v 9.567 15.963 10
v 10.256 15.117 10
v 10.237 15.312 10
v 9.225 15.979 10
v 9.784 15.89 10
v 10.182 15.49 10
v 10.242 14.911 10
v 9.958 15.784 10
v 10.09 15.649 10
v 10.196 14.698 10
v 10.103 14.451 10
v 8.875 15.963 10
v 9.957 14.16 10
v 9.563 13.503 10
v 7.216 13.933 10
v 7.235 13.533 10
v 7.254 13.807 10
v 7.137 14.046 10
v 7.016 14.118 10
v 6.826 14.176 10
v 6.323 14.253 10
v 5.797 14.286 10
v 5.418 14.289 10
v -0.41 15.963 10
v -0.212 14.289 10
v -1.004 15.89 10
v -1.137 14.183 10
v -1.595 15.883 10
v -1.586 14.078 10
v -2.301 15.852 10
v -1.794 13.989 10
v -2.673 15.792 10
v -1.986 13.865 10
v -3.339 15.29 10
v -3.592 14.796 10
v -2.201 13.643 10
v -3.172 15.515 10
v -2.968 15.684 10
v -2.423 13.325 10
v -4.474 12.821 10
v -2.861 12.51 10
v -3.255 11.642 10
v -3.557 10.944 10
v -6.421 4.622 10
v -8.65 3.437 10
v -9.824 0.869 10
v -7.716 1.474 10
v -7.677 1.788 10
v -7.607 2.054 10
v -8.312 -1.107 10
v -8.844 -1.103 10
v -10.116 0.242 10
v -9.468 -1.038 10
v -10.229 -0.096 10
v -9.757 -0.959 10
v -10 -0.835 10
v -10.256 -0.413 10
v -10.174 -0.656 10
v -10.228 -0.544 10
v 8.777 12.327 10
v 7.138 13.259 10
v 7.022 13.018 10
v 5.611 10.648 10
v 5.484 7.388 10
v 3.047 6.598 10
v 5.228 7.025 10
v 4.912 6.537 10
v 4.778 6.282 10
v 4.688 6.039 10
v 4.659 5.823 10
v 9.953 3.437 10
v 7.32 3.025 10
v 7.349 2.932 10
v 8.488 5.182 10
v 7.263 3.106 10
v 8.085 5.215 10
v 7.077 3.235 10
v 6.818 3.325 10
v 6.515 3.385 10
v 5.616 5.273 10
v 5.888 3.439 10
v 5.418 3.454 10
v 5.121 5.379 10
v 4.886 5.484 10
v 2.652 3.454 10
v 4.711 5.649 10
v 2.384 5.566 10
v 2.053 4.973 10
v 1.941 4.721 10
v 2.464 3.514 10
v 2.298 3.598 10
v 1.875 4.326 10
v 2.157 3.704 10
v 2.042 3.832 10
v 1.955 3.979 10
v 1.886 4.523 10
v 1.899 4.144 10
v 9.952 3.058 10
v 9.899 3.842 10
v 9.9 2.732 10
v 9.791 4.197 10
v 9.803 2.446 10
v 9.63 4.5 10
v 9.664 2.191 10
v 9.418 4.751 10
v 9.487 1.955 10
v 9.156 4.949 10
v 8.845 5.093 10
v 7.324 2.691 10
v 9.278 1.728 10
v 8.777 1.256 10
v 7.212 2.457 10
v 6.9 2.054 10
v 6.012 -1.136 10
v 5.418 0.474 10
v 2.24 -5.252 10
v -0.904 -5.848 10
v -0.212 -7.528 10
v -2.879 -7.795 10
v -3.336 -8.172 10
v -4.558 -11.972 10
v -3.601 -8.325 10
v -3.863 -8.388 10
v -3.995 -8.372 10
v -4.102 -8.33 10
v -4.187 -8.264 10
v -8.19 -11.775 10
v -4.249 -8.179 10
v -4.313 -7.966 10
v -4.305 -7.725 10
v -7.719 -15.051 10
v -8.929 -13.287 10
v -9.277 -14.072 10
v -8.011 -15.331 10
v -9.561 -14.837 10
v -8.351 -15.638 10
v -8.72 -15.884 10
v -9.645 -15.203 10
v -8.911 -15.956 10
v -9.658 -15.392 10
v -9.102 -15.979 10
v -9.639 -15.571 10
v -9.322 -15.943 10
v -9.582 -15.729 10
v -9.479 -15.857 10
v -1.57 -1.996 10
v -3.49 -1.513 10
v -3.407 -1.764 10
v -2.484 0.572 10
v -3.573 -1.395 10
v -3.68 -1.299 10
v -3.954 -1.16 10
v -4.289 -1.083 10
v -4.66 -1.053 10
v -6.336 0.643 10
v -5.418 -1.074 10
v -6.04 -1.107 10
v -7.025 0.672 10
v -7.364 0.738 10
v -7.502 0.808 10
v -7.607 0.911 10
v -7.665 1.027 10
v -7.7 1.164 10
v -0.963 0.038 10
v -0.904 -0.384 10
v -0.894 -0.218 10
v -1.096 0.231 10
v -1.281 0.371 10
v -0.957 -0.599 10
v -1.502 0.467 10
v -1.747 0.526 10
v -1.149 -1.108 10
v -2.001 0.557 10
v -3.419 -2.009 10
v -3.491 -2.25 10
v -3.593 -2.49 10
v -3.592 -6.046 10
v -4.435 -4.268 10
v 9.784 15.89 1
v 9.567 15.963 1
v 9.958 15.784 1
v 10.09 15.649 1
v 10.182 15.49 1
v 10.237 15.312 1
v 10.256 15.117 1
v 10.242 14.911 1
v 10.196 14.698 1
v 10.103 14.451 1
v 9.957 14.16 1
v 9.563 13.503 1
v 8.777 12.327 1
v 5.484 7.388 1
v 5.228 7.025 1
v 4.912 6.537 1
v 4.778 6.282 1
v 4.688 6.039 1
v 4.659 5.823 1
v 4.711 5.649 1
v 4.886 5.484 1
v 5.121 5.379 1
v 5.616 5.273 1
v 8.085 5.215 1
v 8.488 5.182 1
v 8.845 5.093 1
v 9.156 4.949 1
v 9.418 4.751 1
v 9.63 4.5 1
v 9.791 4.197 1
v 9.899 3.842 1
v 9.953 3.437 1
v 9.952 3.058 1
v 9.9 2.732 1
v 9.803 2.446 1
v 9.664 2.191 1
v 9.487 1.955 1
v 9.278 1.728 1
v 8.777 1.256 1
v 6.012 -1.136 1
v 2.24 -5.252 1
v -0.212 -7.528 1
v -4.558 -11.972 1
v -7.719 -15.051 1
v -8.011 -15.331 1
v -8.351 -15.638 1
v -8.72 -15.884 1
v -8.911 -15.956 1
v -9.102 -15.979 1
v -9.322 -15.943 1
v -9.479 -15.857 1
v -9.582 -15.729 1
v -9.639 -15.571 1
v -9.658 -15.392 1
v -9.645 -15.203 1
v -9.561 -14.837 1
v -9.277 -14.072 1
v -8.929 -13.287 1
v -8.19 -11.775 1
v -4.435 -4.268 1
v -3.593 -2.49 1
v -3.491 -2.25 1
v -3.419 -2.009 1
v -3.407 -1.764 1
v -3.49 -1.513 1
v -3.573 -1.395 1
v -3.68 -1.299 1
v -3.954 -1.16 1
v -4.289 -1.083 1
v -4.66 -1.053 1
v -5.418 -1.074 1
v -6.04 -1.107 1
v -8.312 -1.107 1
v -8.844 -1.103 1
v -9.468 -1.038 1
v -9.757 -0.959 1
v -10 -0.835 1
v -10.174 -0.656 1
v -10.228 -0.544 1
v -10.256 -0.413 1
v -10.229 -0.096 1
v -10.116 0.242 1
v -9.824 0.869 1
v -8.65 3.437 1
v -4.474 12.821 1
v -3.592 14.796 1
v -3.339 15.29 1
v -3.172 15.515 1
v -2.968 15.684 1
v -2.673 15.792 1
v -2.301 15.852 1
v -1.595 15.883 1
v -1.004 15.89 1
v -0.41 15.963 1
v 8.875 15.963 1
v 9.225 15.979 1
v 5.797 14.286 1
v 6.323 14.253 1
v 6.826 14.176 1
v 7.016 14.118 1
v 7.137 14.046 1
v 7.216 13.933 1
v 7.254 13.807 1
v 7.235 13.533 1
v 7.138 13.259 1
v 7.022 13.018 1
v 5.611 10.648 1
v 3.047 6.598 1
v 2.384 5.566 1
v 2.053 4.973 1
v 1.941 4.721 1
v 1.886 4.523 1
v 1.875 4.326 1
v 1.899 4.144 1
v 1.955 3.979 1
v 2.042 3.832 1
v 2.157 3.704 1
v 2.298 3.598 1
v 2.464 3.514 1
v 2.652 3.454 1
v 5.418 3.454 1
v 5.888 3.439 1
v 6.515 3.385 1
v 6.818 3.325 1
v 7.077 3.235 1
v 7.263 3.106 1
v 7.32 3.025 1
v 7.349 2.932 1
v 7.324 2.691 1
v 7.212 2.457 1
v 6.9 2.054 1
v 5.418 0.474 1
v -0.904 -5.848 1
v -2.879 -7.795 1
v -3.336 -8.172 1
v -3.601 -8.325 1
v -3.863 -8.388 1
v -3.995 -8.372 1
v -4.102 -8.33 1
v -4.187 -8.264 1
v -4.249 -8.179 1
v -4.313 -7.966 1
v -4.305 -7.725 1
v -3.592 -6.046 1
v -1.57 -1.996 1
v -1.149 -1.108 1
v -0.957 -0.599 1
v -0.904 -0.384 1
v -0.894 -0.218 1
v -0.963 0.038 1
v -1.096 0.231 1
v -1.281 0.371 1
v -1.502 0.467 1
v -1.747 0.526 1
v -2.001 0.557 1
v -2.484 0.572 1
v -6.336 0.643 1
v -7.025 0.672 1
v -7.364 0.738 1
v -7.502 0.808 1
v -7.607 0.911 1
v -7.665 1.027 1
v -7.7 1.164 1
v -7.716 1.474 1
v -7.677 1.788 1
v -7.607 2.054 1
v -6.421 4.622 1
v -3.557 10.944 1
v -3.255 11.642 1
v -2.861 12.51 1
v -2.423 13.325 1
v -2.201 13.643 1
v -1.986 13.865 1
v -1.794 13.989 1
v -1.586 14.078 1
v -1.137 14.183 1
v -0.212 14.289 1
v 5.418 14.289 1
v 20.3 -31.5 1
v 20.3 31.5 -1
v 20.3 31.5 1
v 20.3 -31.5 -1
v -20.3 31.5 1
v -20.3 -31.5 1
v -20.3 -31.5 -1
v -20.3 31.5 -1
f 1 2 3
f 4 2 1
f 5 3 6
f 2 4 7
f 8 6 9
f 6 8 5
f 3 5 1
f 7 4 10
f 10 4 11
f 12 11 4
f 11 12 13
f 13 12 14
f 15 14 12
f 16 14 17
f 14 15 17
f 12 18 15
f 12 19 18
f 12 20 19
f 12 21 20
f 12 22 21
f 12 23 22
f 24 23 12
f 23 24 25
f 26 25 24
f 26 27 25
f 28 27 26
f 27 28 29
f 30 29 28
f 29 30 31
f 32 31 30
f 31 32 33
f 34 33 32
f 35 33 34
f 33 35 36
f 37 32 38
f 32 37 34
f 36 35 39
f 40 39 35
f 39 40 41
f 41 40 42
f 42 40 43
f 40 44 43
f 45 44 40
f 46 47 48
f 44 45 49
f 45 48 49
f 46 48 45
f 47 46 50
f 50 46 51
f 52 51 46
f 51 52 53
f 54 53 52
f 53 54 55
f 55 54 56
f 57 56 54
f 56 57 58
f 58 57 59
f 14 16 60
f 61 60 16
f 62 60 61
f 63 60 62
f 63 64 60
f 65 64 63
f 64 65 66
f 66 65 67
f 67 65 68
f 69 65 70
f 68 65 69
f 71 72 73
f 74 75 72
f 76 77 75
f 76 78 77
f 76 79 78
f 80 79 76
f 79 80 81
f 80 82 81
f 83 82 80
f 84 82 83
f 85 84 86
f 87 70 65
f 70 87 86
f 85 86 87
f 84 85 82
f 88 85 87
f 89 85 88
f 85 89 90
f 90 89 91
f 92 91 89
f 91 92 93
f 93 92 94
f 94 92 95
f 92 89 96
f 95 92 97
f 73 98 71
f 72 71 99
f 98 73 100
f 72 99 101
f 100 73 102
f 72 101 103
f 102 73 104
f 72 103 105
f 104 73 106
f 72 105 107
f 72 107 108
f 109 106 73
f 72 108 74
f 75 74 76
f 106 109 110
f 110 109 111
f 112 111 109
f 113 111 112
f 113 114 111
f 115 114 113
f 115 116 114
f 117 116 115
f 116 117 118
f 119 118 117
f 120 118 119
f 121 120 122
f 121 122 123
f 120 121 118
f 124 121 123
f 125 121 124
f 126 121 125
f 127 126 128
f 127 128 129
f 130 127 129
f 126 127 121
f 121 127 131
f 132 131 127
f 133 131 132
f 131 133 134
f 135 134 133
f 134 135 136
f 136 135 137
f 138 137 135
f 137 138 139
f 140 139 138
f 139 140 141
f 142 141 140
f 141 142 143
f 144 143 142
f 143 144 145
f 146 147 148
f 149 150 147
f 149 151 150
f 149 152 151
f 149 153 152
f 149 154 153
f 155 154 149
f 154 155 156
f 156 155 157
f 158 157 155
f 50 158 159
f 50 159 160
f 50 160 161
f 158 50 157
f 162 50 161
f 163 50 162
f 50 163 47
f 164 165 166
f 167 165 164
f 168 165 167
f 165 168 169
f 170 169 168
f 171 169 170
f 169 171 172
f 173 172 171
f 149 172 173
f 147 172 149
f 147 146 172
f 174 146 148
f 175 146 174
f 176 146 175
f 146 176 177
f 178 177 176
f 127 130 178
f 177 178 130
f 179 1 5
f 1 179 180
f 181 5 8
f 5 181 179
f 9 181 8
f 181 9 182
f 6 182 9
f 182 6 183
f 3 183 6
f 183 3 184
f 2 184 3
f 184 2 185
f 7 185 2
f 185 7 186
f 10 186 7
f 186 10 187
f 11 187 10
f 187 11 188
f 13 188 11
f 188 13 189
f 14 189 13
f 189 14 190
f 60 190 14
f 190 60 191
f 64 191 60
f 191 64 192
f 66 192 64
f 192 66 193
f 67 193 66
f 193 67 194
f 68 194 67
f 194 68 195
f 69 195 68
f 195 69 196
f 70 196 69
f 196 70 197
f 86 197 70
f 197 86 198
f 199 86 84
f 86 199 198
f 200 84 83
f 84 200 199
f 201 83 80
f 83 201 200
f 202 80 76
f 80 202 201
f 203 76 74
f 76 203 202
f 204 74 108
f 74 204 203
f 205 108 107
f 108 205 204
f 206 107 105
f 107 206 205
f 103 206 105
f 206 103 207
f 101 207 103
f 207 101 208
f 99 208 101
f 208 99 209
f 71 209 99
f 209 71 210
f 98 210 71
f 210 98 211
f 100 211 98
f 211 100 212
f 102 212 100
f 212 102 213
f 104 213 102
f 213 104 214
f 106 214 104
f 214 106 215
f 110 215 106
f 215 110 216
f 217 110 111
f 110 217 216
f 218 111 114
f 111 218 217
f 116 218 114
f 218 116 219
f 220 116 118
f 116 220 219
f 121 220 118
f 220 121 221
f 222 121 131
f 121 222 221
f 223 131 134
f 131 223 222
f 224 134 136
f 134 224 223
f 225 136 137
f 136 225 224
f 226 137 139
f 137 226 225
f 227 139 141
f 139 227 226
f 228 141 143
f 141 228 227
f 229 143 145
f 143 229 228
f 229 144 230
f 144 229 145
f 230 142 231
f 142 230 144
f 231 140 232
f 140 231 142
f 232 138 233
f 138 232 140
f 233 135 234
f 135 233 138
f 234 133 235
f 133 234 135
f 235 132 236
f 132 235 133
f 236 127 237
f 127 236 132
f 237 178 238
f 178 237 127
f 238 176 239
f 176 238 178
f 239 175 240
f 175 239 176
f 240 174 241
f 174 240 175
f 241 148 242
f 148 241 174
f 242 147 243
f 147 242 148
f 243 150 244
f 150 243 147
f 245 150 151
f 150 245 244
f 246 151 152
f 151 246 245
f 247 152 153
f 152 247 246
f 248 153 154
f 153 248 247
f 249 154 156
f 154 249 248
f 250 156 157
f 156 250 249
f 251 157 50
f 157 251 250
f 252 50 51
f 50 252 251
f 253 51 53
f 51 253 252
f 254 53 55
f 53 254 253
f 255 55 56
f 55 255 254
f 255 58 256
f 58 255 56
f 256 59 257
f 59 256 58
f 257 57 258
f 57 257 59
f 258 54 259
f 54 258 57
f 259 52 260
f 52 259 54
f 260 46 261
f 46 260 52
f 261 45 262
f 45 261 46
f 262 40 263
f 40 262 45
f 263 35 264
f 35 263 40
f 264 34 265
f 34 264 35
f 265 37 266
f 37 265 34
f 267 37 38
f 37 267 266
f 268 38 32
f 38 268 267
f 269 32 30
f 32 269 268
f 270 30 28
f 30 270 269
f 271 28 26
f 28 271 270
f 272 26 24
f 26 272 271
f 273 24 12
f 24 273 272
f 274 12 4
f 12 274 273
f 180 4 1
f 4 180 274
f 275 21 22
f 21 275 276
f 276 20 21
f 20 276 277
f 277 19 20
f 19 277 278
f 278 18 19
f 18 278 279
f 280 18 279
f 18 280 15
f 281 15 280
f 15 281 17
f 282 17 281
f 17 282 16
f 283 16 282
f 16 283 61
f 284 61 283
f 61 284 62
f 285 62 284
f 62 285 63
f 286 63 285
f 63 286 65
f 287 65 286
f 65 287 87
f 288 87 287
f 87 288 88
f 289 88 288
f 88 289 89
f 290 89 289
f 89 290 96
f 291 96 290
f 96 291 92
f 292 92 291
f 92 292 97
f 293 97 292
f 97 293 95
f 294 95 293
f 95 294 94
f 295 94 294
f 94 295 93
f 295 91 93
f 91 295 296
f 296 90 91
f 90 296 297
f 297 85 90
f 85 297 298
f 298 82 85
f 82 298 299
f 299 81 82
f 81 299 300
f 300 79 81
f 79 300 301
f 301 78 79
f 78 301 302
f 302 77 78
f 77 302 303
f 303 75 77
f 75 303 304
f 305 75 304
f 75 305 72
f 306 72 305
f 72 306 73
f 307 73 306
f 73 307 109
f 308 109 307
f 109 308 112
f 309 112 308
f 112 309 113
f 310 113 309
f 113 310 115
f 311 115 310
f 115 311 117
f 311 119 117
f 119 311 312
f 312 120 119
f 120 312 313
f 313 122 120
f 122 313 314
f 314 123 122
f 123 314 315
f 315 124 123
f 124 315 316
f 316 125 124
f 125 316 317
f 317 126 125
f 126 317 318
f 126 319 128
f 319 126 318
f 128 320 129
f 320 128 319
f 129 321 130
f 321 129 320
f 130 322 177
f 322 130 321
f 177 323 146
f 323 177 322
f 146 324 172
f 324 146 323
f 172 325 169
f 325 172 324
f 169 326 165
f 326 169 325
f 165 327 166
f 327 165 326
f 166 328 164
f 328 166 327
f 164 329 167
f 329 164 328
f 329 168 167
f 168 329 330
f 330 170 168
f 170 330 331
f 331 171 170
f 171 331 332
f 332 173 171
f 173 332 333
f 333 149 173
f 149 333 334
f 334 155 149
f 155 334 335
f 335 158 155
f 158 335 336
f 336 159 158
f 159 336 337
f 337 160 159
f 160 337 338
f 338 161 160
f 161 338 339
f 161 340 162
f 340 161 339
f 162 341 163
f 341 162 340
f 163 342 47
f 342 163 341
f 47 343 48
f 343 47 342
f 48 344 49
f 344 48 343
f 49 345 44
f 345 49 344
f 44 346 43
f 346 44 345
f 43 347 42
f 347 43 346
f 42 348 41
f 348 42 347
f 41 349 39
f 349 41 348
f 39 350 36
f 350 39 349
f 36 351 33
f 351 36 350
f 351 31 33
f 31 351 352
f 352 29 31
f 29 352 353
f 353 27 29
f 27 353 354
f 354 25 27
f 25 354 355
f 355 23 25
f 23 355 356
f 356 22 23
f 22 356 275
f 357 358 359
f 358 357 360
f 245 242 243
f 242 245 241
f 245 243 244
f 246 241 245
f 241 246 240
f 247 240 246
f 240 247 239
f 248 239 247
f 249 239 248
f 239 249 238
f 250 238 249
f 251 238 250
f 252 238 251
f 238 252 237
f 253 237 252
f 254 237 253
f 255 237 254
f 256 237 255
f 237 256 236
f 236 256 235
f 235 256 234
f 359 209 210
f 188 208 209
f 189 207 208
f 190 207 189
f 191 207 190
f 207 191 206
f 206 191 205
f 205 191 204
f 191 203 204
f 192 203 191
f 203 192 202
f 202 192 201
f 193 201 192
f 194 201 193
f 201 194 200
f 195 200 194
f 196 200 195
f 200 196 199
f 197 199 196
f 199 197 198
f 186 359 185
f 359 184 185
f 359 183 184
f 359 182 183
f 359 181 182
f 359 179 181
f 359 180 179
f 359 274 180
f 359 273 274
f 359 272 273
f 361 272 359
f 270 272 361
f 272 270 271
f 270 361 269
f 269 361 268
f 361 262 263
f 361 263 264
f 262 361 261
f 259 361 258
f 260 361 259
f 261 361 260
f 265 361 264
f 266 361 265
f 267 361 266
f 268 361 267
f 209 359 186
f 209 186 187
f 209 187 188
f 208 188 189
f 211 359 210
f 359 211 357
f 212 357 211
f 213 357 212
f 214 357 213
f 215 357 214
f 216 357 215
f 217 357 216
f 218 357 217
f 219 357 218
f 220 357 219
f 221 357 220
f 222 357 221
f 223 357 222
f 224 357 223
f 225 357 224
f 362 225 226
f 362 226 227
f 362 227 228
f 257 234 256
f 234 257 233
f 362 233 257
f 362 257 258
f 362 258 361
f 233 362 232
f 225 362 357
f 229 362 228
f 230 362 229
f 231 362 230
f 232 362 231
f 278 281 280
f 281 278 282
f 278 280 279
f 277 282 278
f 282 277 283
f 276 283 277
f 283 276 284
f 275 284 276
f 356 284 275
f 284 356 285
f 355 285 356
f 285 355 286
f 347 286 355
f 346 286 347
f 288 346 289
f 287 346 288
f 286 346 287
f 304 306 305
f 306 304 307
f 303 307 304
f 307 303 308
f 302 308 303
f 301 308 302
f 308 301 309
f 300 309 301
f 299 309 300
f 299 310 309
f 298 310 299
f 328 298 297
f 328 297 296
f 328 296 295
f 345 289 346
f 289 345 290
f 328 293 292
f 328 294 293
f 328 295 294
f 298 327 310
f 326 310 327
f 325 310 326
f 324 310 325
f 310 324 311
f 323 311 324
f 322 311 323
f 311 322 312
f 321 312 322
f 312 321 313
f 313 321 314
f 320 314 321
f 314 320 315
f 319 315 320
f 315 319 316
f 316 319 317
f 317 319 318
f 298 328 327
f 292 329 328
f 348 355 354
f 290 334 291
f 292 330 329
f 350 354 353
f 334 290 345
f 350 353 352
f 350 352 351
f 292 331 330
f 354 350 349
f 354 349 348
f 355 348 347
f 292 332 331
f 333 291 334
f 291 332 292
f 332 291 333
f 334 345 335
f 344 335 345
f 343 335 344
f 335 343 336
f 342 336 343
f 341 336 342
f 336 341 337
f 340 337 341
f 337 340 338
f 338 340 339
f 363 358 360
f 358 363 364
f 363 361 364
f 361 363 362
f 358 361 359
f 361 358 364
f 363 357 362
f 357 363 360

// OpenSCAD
// file: ../../lightning-bolt.scad
// Module names are of the form poly_<inkscape-path-id>().  As a result,
// you can associate a polygon in this OpenSCAD program with the corresponding
// SVG element in the Inkscape document by looking for the XML element with
// the attribute id="inkscape-path-id".

// fudge value is used to ensure that subtracted solids are a tad taller
// in the z dimension than the polygon being subtracted from.  This helps
// keep the resulting .stl file manifold.
fudge = 0.1;

module poly_Selection(h)
{
  scale([25.4/90, -25.4/90, 1]) union()
  {
    difference()
    {
       linear_extrude(height=h)
         polygon([[-4.148906,-161.604375],[29.851094,-161.604375],[89.851094,-161.604375],[93.388594,-161.765625],[96.851094,-161.604375],[99.052539,-160.861992],[100.810781,-159.788437],[102.146680,-158.426602],[103.081094,-156.819375],[103.634883,-155.009648],[103.828906,-153.040312],[103.684023,-150.954258],[103.221094,-148.794375],[102.277969,-146.302969],[100.798594,-143.351250],[96.816094,-136.696875],[88.851094,-124.794375],[55.521094,-74.794375],[52.930781,-71.123125],[49.723594,-66.176875],[48.375586,-63.594766],[47.457656,-61.136875],[47.164570,-58.950859],[47.691094,-57.184375],[49.468281,-55.523281],[51.843594,-54.455625],[56.851094,-53.384375],[81.851094,-52.794375],[85.930117,-52.456934],[89.547656,-51.555469],[92.689414,-50.098770],[95.341094,-48.095625],[97.488398,-45.554824],[99.117031,-42.485156],[100.212695,-38.895410],[100.761094,-34.794375],[100.747676,-30.961406],[100.226250,-27.654375],[99.240059,-24.763594],[97.832344,-22.179375],[96.046348,-19.792031],[93.925313,-17.491875],[88.851094,-12.714375],[60.861094,11.495625],[22.681094,53.165625],[-2.148906,76.215625],[-46.148906,121.205625],[-78.148906,152.375625],[-81.104219,155.211094],[-84.541406,158.319375],[-88.282344,160.803281],[-90.211055,161.530723],[-92.148906,161.765625],[-94.372402,161.407539],[-95.966250,160.530312],[-97.010488,159.238242],[-97.585156,157.635625],[-97.770293,155.826758],[-97.645937,153.915937],[-96.788906,150.205625],[-93.919844,142.465000],[-90.396406,134.510625],[-82.908906,119.205625],[-44.898906,43.205625],[-36.378906,25.205625],[-35.345781,22.782813],[-34.608906,20.343125],[-34.494531,17.862187],[-35.328906,15.315625],[-36.170610,14.127329],[-37.254570,13.148945],[-40.029844,11.748437],[-43.415898,10.967148],[-47.173906,10.658125],[-54.850469,10.869062],[-61.148906,11.205625],[-84.148906,11.205625],[-89.537187,11.162031],[-95.852656,10.511875],[-98.777129,9.708848],[-101.236250,8.453594],[-102.997637,6.645918],[-103.544060,5.503611],[-103.828906,4.185625],[-103.551094,0.976250],[-102.416406,-2.454375],[-99.458906,-8.794375],[-87.568906,-34.794375],[-45.288906,-129.794375],[-36.368906,-149.794375],[-33.801406,-154.788125],[-32.116406,-157.068906],[-30.048906,-158.784375],[-27.055781,-159.877500],[-23.293906,-160.479375],[-16.148906,-160.794375],[-10.167656,-160.861875],[-4.148906,-161.604375]]);
       translate([0, 0, -fudge])
         linear_extrude(height=h+2*fudge)
           polygon([[-2.148906,-144.654375],[-11.515156,-143.585625],[-16.058125,-142.526719],[-18.163730,-141.618809],[-20.108906,-140.364375],[-22.284258,-138.120078],[-24.525469,-134.897500],[-28.966406,-126.644375],[-32.953594,-117.858750],[-36.008906,-110.794375],[-65.008906,-46.794375],[-77.008906,-20.794375],[-77.717656,-18.100625],[-78.111406,-14.919375],[-77.953906,-11.783125],[-77.594609,-10.398281],[-77.008906,-9.224375],[-75.949375,-8.181387],[-74.555156,-7.474844],[-71.118906,-6.800625],[-64.148906,-6.514375],[-25.148906,-5.794375],[-20.262344,-5.639844],[-17.686992,-5.320645],[-15.208906,-4.723125],[-12.967070,-3.759512],[-11.100469,-2.342031],[-9.748086,-0.382910],[-9.048906,2.205625],[-9.148008,3.888379],[-9.686094,6.060156],[-11.633906,11.216875],[-15.898906,20.205625],[-36.368906,61.205625],[-43.578906,78.205625],[-43.665156,80.649063],[-43.016406,82.798125],[-42.384766,83.660898],[-41.531406,84.328437],[-40.443672,84.760195],[-39.108906,84.915625],[-36.457187,84.283281],[-33.772656,82.729375],[-29.148906,78.915625],[-9.148906,59.205625],[54.851094,-4.794375],[69.851094,-20.794375],[73.011094,-24.875625],[74.145781,-27.247656],[74.401094,-29.684375],[74.109907,-30.624995],[73.529883,-31.442773],[71.644531,-32.745312],[69.027461,-33.663008],[65.961094,-34.266875],[59.610156,-34.817188],[54.851094,-34.964375],[26.851094,-34.964375],[24.944707,-35.570820],[23.266250,-36.420312],[21.835527,-37.498086],[20.672344,-38.789375],[19.796504,-40.279414],[19.227813,-41.953437],[18.986074,-43.796680],[19.091094,-45.794375],[19.653008,-47.792656],[20.785156,-50.341250],[24.138594,-56.346875],[30.851094,-66.794375],[56.801094,-107.794375],[71.091094,-131.794375],[72.260937,-134.232188],[73.242344,-137.009375],[73.438125,-139.779062],[73.054785,-141.052695],[72.251094,-142.194375],[71.029297,-142.931309],[69.104844,-143.516719],[64.008594,-144.290625],[58.683594,-144.631406],[54.851094,-144.654375],[-2.148906,-144.654375]]);
    }
  }
}

module lightningBolt(height = 1,
                     showBackground = false)
{
    scaleFactor = 0.35;
    scale([scaleFactor, 
          scaleFactor + 0.0, 
           1])
    poly_Selection(height);

    if(showBackground)
    {
        color("green")
        cube([20.6, 32, height], center = true);
    }    
}
// file: ../letters-symbols-faceplate.scad
use <../lightning-bolt.scad>;

LETTER_D = 68;
LETTER_E = 69;
LETTER_G = 71;
LETTER_I = 73;
LETTER_O = 79;

SYMBOL_LIGHTNING_BOLT = 33;

STANDARD_LETTER_HEIGHT = 33; // see the O.scad

module lettersSymbolsFaceplate(horizontalPadding = 10,
                               slot1 = SYMBOL_LIGHTNING_BOLT,
                               slotWidth1 = 20.6,
                               verticalPadding = 15,
                               zLength = 2)
{
    union()
    {
        cubeLengthX = horizontalPadding + 
                      slotWidth1 +
                      horizontalPadding;

        cubeLengthY = verticalPadding + 
                      STANDARD_LETTER_HEIGHT +
                      verticalPadding;                              

        color("green")
        cube(center = true,
             size = [cubeLengthX, cubeLengthY, zLength]);

        letter1TranslateX = horizontalPadding;
        letterSymbol(slot1, slotWidth1, letter1TranslateX);
    }
}

module letterSymbol(slot, slotWidth, letterTranslateX)
{
    if(slot == SYMBOL_LIGHTNING_BOLT)
    {
        lightningBolt(height = 10);
    }
    else
    {
        echo("no slot id found for: ", slot);
    }
}
// main file
use <../letters-symbols-faceplate.scad>;

lettersSymbolsFaceplate();
